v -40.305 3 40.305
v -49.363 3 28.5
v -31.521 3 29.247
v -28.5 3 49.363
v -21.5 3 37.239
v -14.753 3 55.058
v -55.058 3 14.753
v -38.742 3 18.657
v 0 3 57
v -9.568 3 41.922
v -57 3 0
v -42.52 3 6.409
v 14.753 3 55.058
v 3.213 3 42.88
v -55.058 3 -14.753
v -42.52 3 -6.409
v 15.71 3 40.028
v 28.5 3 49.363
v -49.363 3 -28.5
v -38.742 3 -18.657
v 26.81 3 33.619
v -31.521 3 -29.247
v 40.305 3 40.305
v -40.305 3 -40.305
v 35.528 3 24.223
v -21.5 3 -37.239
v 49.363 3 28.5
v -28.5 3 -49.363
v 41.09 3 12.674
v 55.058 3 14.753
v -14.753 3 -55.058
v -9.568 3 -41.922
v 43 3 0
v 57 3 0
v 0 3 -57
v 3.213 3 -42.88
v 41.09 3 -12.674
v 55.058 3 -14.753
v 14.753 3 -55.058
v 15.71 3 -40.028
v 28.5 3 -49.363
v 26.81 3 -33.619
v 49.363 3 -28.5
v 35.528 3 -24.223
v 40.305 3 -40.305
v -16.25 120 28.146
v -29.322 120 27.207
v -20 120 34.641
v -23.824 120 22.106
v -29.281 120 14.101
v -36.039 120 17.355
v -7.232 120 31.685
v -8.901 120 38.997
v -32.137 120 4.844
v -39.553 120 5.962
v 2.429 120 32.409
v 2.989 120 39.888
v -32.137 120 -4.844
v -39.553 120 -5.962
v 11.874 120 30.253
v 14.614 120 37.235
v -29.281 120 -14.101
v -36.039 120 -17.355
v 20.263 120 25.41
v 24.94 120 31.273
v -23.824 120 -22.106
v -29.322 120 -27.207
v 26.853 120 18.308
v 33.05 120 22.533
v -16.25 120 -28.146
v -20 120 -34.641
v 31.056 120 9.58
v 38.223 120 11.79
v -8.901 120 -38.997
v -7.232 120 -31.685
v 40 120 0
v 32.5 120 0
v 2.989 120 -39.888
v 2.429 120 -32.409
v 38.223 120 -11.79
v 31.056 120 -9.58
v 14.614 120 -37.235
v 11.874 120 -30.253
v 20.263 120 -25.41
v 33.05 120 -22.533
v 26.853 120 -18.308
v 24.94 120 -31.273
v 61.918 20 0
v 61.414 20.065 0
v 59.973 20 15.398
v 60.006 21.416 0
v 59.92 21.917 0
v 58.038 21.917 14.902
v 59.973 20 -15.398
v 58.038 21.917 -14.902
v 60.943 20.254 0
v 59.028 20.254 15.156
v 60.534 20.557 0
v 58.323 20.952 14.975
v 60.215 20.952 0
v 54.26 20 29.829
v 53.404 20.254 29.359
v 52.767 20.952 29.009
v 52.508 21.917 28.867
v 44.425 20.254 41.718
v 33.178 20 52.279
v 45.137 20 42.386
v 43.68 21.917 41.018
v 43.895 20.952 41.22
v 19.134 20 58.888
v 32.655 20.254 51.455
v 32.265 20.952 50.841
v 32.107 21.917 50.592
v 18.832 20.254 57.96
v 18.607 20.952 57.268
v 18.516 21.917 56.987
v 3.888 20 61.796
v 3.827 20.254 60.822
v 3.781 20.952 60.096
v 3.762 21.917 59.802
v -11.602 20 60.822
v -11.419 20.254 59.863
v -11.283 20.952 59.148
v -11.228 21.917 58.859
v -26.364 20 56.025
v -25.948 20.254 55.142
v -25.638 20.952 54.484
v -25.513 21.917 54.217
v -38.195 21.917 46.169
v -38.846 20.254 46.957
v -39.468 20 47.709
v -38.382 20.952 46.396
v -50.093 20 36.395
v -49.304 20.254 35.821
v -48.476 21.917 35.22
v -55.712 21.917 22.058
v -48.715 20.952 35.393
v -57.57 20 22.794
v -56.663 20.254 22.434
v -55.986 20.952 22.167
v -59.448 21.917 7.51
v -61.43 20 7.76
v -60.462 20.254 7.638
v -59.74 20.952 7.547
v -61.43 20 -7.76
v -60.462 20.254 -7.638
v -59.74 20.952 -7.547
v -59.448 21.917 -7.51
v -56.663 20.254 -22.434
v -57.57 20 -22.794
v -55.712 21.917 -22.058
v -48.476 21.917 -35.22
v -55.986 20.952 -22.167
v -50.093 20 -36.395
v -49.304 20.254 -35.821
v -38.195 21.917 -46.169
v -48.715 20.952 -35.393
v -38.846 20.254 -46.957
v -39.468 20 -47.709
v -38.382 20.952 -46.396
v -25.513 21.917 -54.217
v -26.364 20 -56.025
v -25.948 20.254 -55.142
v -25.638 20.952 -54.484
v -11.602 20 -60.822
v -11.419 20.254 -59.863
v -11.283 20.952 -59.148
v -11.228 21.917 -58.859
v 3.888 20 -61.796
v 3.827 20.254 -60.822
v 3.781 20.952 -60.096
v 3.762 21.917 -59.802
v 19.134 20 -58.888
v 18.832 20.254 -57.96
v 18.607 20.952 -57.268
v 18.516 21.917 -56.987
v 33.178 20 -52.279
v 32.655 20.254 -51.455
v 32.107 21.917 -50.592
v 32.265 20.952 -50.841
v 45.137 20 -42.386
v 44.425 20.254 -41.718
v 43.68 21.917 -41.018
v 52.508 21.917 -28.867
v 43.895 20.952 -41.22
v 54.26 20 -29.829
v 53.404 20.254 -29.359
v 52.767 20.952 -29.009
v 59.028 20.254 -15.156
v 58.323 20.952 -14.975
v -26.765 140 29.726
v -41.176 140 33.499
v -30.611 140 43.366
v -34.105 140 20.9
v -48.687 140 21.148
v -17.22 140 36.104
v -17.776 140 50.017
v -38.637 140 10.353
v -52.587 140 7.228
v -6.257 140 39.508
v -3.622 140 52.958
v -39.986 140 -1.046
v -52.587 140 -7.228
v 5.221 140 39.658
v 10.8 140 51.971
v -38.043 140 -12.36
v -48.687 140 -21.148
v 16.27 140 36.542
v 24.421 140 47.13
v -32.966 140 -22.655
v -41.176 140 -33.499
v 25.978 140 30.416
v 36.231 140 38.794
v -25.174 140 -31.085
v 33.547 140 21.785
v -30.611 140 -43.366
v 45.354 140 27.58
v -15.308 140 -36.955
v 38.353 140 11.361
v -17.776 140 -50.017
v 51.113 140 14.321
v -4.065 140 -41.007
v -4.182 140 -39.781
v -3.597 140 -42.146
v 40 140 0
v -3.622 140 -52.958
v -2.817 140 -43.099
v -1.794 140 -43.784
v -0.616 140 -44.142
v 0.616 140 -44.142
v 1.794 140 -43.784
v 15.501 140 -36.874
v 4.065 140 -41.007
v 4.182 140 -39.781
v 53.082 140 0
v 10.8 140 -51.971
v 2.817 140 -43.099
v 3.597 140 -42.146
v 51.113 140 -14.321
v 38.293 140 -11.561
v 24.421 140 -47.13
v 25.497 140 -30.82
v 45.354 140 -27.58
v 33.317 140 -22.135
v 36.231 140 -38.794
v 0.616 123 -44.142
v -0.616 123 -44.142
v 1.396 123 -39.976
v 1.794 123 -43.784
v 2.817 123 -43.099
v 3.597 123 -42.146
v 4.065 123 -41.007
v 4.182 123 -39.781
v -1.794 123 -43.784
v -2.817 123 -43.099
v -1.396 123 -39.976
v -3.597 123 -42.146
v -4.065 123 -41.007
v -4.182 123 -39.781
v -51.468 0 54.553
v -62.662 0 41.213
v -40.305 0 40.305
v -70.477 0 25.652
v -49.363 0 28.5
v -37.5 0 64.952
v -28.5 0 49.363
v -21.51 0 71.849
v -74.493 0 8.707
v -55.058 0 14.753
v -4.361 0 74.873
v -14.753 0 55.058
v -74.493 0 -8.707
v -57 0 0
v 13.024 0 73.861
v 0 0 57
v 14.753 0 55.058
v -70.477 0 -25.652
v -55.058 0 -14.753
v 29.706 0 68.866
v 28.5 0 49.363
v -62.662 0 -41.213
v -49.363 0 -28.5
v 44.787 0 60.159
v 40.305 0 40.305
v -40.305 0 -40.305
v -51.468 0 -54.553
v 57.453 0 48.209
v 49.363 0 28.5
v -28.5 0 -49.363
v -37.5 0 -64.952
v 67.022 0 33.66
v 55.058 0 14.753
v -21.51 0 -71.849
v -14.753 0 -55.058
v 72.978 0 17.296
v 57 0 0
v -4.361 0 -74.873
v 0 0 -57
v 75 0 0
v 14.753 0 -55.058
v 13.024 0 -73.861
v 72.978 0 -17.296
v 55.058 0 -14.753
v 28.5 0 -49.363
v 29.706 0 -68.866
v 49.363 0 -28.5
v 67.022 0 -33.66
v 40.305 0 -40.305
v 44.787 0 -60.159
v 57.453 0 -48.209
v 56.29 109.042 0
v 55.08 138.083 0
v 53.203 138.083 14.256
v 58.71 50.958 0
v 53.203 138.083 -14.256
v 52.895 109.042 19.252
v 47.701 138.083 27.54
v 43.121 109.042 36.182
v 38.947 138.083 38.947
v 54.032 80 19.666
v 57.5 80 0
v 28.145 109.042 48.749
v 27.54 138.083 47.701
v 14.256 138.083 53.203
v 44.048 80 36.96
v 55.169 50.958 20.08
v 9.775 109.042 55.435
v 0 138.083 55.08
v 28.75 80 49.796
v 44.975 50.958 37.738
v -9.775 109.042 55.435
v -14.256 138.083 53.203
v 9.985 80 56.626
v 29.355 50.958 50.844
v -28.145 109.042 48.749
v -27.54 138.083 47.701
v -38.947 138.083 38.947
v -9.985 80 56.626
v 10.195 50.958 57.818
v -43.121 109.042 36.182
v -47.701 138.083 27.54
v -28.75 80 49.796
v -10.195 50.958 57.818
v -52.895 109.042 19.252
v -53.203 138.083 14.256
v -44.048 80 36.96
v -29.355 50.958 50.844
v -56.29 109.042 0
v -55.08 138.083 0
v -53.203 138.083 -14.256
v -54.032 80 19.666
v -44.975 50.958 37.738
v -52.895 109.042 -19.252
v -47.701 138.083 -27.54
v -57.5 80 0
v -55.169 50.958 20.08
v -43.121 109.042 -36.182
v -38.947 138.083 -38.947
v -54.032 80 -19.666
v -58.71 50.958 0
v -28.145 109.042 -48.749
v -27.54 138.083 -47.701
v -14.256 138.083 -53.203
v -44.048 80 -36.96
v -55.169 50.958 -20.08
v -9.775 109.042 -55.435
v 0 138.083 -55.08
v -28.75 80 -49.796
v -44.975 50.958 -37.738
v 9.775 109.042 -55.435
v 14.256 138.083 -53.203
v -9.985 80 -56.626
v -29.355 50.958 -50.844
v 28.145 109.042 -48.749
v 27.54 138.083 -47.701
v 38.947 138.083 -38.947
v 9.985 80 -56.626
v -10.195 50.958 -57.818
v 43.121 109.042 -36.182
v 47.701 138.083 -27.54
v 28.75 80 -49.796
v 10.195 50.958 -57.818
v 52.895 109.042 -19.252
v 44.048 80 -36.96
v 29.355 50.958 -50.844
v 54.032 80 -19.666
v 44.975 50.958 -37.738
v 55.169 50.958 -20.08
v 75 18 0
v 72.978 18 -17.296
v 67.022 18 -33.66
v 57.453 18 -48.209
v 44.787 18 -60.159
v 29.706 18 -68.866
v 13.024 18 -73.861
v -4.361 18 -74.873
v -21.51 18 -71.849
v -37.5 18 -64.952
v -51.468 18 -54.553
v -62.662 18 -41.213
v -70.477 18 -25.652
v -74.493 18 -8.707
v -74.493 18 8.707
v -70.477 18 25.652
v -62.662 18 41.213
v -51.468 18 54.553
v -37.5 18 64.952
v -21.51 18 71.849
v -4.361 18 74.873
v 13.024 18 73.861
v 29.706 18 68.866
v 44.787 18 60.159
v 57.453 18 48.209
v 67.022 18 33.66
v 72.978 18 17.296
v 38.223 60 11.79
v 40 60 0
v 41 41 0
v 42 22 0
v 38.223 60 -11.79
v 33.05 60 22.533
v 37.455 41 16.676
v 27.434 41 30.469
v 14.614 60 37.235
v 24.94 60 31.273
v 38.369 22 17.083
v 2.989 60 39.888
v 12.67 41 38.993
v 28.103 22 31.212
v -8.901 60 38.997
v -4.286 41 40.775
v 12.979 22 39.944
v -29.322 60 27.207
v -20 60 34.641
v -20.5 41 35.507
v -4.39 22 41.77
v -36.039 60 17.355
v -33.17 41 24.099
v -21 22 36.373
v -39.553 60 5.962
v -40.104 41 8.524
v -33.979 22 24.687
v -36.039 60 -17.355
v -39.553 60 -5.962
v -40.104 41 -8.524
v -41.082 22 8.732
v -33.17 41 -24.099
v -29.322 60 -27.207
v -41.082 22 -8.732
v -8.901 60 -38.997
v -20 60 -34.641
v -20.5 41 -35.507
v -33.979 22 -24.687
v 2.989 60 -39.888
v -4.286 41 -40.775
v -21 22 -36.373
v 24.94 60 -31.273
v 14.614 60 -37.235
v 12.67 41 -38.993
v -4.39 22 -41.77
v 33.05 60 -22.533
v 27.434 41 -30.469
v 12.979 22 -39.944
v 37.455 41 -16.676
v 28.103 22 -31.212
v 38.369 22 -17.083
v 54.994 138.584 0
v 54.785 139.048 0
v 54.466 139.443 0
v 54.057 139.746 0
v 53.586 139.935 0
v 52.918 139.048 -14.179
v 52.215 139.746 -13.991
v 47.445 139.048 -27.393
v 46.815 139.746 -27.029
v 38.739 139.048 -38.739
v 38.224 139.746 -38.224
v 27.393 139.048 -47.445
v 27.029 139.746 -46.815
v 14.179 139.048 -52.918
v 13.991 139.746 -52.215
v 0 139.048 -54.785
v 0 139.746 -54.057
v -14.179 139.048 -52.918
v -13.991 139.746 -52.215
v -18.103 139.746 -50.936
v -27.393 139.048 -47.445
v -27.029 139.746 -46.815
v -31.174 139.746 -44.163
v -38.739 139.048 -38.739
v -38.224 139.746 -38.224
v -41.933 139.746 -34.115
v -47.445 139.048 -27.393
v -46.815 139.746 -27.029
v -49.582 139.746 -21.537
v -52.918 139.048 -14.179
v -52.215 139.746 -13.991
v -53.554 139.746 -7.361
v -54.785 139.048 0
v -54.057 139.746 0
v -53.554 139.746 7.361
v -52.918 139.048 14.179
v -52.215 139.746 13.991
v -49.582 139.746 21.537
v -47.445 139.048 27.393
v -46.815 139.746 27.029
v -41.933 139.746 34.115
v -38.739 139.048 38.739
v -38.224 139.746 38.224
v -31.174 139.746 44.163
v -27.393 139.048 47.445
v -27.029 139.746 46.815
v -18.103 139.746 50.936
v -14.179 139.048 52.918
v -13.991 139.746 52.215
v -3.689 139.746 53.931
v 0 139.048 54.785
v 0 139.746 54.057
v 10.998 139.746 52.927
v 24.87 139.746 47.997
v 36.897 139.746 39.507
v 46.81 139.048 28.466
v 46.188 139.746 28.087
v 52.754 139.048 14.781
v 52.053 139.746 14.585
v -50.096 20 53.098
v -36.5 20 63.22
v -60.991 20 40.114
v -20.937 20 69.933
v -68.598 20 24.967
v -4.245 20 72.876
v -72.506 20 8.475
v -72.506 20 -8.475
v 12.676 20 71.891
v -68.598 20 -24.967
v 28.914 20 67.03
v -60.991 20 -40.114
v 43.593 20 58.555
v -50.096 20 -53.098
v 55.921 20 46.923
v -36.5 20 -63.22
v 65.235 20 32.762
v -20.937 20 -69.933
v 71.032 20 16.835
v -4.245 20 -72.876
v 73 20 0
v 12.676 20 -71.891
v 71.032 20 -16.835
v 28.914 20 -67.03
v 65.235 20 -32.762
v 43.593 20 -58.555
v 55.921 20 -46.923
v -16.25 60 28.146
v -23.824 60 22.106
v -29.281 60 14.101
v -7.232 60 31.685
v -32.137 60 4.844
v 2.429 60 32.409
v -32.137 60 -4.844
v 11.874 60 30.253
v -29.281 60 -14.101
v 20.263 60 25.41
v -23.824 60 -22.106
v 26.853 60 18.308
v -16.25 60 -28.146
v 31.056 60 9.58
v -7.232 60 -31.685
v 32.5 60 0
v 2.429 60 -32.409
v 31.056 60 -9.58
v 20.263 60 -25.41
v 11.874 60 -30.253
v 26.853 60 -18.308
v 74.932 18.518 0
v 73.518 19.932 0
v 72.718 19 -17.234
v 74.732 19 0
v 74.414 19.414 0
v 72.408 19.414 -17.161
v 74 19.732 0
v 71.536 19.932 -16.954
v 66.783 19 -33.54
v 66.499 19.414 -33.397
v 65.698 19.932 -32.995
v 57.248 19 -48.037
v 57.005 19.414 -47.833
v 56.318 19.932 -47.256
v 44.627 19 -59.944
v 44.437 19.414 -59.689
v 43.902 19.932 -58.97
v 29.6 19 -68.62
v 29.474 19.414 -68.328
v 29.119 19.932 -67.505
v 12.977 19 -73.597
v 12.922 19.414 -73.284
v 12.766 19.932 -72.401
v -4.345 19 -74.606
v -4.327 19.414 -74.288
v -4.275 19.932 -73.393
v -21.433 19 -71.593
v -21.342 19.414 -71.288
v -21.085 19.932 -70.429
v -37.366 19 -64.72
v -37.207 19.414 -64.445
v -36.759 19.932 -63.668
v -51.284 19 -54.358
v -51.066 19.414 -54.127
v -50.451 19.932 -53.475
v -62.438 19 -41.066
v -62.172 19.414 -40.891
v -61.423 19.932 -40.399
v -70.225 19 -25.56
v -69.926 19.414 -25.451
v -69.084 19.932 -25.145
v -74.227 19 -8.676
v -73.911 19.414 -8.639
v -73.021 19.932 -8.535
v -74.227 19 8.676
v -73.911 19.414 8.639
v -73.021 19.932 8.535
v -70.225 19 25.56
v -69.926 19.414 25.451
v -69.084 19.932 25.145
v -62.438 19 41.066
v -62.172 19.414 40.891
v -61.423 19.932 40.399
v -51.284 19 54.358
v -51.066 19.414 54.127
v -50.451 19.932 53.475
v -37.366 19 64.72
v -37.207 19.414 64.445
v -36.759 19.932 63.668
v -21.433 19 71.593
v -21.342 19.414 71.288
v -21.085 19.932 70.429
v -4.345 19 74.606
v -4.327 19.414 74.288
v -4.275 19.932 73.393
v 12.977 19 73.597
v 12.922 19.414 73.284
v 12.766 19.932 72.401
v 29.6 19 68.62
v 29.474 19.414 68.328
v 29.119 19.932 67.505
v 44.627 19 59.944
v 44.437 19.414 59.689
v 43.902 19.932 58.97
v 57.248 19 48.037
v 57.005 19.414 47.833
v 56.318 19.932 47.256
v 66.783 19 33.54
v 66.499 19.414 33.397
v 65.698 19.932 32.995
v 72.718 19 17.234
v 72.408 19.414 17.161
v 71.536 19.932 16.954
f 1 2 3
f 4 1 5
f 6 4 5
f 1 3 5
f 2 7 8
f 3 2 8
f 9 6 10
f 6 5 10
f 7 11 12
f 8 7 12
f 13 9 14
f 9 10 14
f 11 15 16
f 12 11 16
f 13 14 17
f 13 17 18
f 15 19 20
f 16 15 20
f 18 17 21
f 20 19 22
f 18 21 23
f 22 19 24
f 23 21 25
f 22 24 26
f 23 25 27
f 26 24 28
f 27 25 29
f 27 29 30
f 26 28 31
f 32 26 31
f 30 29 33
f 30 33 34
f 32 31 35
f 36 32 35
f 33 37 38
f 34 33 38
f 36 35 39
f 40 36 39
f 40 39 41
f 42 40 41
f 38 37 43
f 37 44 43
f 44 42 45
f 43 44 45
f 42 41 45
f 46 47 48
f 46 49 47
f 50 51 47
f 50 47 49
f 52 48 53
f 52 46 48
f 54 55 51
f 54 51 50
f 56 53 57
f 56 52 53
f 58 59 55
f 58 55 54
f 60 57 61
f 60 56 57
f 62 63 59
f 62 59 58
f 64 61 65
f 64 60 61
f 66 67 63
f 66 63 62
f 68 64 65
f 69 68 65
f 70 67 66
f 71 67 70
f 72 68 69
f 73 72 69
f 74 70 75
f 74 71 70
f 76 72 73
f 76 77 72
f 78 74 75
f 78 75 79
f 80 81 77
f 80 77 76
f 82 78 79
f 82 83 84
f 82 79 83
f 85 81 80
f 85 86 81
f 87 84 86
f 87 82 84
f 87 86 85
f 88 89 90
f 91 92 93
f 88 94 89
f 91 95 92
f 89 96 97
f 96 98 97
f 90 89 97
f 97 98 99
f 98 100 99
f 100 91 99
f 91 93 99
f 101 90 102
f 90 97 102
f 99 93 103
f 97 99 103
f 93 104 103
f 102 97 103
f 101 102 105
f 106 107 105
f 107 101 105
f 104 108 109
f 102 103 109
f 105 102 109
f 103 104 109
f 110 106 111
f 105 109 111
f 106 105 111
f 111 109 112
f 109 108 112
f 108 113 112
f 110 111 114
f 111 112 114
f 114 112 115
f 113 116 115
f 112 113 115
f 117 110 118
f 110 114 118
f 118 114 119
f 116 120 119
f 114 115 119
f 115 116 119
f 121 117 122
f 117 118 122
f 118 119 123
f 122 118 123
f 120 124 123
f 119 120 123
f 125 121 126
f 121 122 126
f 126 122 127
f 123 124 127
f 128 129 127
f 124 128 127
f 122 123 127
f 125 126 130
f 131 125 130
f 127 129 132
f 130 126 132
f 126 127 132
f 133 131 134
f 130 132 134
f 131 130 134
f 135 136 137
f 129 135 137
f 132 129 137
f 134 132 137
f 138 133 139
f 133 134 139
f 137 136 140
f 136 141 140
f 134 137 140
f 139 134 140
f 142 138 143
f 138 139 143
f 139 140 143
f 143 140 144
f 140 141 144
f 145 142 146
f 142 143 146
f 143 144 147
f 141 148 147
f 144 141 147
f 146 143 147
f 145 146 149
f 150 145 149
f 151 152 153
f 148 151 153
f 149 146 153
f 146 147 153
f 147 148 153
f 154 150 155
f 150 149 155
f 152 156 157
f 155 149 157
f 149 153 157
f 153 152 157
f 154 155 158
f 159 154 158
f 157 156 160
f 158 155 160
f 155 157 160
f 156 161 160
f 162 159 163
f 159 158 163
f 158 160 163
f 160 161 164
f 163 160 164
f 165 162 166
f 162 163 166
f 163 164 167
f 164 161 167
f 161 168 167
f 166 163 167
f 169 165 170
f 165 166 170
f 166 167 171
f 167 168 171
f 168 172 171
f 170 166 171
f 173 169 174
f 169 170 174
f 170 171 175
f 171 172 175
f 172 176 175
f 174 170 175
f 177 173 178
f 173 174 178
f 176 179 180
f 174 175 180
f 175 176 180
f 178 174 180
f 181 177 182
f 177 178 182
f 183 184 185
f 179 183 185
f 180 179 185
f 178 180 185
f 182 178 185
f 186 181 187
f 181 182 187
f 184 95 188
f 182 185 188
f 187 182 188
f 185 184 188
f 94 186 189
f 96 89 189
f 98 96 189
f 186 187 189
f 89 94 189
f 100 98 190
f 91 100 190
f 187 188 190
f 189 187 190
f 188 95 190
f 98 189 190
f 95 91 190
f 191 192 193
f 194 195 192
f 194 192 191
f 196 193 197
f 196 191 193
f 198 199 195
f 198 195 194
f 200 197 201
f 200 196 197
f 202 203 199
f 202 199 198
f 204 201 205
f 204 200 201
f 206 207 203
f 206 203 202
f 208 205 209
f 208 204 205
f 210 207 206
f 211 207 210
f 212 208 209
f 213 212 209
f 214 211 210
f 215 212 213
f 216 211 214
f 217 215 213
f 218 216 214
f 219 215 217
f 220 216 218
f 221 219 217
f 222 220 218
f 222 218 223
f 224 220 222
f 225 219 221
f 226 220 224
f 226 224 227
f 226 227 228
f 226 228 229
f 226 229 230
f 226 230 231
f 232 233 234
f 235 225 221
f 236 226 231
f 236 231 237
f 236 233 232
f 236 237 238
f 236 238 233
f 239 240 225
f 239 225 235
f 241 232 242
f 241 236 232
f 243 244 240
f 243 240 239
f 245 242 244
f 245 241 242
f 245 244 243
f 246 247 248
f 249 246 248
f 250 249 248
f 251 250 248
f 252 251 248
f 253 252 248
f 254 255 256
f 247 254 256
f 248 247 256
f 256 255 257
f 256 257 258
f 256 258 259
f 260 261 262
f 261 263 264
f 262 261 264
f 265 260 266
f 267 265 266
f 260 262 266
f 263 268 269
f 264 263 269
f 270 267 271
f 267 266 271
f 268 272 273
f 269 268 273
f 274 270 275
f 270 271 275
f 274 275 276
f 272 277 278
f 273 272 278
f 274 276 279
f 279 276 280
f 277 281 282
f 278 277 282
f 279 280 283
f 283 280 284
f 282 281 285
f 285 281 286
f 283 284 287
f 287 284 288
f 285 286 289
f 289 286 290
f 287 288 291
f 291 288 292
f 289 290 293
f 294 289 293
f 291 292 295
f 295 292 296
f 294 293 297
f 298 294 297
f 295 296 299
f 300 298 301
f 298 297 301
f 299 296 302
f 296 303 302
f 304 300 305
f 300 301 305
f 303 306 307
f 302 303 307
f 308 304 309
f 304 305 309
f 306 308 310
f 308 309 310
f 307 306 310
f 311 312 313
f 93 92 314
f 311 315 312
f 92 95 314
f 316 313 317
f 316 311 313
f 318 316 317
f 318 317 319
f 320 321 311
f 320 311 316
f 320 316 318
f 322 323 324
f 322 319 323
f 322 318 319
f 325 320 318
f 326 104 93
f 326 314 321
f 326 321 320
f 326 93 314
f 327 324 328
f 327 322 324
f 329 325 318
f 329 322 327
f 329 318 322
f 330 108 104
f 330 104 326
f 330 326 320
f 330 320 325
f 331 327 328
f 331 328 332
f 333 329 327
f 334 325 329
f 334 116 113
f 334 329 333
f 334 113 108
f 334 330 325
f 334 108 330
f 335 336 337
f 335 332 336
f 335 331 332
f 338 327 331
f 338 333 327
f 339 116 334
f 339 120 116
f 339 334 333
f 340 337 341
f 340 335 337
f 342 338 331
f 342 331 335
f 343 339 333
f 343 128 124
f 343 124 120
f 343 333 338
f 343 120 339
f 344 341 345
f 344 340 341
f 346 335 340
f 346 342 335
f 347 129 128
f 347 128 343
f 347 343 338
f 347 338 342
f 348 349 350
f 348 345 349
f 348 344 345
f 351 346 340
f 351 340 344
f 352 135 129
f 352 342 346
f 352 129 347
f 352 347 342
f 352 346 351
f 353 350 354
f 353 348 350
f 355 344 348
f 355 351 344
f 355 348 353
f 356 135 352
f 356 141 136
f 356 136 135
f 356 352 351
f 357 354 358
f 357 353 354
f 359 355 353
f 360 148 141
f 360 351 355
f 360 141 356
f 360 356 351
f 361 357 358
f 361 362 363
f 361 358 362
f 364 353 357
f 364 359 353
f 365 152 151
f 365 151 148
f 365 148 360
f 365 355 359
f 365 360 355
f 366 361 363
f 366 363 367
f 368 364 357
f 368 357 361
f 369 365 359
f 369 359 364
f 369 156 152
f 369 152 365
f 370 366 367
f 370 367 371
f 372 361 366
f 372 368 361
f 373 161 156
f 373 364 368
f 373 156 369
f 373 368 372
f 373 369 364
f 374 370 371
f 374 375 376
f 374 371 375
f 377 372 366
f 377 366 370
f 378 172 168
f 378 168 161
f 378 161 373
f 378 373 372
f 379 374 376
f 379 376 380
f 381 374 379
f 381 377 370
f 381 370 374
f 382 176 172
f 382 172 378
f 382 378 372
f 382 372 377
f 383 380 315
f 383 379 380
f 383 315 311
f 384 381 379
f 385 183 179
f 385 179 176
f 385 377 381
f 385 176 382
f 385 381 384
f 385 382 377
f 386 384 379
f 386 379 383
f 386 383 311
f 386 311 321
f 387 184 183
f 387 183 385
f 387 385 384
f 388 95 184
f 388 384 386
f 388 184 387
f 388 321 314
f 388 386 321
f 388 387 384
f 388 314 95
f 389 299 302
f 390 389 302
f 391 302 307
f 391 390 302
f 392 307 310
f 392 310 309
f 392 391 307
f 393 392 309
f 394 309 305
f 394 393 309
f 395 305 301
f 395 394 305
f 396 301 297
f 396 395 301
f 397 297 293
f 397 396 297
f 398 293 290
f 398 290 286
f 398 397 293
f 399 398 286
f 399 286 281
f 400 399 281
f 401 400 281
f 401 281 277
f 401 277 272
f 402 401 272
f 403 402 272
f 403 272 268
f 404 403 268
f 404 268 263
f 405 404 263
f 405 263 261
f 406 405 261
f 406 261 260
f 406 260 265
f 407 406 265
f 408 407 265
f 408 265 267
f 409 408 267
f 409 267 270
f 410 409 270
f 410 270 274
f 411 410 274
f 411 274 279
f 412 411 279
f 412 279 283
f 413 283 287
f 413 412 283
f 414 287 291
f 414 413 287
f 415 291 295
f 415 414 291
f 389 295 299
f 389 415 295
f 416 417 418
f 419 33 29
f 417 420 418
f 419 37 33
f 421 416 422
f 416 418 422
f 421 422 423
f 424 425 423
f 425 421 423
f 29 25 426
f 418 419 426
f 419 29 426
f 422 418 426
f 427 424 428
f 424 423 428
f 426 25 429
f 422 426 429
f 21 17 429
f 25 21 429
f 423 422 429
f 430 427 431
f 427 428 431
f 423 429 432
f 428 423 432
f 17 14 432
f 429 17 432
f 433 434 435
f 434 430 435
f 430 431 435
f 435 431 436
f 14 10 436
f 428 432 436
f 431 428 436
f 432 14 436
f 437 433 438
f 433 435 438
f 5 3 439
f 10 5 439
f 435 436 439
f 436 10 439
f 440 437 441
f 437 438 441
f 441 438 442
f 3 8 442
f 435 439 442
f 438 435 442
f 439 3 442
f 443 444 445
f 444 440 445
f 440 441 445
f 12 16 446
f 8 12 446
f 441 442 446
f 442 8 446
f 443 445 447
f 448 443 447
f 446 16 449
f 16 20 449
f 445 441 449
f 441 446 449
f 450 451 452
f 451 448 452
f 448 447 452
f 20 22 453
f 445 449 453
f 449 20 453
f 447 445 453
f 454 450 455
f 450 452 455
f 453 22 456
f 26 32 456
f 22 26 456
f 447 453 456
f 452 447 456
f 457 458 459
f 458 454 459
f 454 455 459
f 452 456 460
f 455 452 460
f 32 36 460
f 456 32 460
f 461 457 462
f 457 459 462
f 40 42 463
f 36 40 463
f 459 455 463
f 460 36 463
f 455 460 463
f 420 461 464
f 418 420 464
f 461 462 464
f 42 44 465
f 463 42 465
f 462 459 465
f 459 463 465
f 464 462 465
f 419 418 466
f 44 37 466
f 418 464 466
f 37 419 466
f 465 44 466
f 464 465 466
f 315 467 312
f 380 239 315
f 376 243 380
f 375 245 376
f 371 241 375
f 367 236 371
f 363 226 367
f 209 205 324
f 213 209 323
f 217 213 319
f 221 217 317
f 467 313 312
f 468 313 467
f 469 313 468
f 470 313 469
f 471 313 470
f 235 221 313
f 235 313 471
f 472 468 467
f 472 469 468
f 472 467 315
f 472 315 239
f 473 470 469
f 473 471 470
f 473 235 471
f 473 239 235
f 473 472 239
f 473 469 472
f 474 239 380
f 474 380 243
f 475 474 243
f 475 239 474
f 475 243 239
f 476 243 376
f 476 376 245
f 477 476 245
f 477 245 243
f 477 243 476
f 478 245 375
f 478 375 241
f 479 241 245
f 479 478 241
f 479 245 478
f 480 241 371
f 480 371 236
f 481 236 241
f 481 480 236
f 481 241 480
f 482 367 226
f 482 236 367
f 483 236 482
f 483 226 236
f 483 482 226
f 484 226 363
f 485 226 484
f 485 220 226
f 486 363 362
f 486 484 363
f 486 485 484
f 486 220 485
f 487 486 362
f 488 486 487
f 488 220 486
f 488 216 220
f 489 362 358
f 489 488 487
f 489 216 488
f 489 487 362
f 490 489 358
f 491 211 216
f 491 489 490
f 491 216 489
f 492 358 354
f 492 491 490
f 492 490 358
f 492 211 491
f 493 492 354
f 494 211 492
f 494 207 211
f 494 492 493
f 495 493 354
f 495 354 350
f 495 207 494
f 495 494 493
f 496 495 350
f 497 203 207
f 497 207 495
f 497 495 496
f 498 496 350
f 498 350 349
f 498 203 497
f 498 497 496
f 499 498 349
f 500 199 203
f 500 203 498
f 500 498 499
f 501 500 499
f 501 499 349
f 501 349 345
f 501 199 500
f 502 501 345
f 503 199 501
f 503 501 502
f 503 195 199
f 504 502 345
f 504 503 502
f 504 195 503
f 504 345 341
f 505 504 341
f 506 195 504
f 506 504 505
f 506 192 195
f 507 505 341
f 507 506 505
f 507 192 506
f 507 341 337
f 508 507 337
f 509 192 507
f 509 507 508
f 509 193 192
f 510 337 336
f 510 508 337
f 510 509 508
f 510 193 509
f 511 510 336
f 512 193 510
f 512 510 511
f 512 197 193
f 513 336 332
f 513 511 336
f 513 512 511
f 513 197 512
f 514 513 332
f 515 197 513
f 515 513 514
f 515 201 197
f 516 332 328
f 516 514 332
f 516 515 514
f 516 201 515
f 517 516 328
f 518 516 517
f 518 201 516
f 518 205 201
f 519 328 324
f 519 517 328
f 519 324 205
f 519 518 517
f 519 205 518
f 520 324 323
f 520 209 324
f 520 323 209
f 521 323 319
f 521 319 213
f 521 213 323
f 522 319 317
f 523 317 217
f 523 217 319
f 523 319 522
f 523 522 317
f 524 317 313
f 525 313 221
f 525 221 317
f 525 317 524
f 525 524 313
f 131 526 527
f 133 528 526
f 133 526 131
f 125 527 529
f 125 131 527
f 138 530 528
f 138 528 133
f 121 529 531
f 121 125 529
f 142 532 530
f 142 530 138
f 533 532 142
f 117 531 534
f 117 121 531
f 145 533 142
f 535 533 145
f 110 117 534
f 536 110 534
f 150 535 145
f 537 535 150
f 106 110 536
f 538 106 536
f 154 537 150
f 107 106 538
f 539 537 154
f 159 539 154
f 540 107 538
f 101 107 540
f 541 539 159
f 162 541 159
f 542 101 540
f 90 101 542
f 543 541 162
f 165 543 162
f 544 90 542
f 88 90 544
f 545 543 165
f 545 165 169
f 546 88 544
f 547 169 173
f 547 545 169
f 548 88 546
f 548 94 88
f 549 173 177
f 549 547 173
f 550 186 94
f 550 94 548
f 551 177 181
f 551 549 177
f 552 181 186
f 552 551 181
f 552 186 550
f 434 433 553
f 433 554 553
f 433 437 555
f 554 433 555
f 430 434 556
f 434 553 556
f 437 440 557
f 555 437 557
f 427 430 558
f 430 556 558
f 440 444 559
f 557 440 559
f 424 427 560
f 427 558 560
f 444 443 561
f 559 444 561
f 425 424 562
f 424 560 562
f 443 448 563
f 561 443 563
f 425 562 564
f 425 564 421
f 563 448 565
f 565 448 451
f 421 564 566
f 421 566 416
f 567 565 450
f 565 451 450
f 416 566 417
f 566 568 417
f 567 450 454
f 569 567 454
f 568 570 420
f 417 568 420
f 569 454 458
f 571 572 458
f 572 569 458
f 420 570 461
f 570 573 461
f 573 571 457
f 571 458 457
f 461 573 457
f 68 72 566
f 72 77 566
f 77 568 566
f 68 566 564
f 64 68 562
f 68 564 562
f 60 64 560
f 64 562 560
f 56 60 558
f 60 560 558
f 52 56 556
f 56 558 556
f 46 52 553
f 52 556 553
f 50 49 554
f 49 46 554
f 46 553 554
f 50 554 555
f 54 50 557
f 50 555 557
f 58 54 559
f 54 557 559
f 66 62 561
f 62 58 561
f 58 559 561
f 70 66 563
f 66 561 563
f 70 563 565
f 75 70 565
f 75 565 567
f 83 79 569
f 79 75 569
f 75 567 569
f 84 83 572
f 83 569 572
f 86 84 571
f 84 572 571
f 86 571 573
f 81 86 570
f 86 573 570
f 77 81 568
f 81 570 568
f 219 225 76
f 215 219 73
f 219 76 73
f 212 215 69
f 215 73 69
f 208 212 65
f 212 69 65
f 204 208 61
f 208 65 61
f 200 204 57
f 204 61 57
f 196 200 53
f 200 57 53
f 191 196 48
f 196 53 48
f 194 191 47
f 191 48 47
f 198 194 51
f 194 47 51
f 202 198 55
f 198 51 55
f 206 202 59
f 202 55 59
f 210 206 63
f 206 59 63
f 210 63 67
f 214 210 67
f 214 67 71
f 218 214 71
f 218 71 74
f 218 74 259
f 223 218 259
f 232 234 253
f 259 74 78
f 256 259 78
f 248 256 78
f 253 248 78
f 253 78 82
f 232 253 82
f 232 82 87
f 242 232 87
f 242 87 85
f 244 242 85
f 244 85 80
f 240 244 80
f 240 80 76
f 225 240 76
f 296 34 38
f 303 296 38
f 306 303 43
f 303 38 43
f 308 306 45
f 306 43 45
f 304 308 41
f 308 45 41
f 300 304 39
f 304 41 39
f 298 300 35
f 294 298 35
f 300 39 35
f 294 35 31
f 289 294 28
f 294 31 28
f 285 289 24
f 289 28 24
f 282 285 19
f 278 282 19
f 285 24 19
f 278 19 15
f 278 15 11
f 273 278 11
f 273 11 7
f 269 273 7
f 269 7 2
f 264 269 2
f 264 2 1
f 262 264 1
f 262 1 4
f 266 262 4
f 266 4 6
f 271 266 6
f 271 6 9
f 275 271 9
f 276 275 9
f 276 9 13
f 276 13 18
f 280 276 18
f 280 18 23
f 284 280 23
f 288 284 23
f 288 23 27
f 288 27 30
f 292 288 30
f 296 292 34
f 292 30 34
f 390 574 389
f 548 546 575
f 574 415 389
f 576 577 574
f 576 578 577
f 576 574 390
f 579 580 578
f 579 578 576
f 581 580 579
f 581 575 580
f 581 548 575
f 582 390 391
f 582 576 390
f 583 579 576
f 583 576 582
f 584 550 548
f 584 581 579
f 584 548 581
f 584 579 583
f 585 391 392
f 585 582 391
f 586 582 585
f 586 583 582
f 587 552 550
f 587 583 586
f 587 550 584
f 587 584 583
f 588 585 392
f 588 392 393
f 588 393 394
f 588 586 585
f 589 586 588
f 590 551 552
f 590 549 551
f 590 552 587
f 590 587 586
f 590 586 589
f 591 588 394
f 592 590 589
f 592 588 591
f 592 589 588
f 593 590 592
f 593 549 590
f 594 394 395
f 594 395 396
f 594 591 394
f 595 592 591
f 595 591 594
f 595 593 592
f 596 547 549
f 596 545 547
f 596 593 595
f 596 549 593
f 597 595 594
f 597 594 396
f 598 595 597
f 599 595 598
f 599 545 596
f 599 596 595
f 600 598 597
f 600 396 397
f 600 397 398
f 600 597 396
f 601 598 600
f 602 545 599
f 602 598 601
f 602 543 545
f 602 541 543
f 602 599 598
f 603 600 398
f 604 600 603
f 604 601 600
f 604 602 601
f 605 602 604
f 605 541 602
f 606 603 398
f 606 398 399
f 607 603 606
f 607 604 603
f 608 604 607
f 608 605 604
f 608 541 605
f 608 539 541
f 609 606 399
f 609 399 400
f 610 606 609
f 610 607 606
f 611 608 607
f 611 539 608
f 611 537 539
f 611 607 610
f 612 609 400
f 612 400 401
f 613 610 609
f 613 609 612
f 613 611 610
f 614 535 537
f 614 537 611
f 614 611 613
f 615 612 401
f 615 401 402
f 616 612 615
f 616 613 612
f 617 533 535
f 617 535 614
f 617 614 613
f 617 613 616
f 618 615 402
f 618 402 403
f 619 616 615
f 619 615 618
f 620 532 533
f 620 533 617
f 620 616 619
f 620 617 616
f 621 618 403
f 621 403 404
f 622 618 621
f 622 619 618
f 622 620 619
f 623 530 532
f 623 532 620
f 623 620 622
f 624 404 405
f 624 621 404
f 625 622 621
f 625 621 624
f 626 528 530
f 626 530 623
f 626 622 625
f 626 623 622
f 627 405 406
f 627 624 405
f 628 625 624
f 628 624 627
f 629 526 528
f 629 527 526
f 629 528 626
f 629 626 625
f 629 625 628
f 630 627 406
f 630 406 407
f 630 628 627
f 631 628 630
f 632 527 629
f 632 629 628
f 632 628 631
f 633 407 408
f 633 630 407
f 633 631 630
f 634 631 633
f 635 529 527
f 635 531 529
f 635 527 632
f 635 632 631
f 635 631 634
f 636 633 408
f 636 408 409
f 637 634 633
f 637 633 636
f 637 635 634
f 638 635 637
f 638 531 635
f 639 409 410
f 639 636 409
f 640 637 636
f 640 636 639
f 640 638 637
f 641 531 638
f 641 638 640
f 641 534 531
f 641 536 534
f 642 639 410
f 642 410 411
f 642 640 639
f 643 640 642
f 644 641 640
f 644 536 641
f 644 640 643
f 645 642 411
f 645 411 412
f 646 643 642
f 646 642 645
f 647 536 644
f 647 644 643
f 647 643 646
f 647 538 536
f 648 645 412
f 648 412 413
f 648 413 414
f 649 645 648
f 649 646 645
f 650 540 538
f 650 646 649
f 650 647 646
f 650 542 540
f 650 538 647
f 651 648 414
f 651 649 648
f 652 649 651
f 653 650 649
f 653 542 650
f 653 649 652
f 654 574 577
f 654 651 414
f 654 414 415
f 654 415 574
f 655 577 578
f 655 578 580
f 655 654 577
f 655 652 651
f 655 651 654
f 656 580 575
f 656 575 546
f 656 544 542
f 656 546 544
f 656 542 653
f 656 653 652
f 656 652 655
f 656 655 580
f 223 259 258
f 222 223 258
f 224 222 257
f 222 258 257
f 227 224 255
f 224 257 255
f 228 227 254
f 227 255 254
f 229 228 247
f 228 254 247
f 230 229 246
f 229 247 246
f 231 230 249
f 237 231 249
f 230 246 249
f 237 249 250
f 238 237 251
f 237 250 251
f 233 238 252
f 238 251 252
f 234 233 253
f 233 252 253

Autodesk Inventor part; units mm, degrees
ref_plane "YZ Plane" through (0, 0, 0) normal (1, 0, 0) x (0, 1, 0)
ref_plane "XZ Plane" through (0, 0, 0) normal (0, 1, 0) x (-1, 0, 0)
ref_plane "XY Plane" through (0, 0, 0) normal (0, 0, 1) x (1, 0, 0)
sketch "草图1" plane through (0, 0, 0) normal (0, 0, 1) x (1, 0, 0)
  line L0 (0, 0) -> (57, 0)
  line L1 (57, 0) -> (75, 0)
  line L2 (75, 0) -> (75, 20)
  line L3 (0, 0) -> (0, 140)
  line L4 (0, 140) -> (55, 140)
  line L5 (0, 140) -> (40, 140)
  line L6 (40, 140) -> (40, 120)
  line L7 (40, 120) -> (32.5, 120)
  line L8 (32.5, 120) -> (32.5, 60)
  line L9 (32.5, 60) -> (40, 60)
  line L10 (57, 0) -> (57, 3)
  line L11 (57, 3) -> (0, 3)
  line L12 (0, 3) -> (43, 3)
  line L13 (43, 3) -> (40, 60)
  line L14 (75, 20) -> (0, 20)
  line L15 (0, 20) -> (60, 20)
  line L16 (60, 20) -> (55, 140)
  dimension "d0" = 57
  dimension "d1" = 18
  dimension "d2" = 20
  dimension "d3" = 140
  dimension "d4" = 55
  dimension "d5" = 40
  dimension "d6" = 20
  dimension "d7" = 7.5
  dimension "d10" = 7.5
  dimension "d11" = 3
  dimension "d12" = 43
  dimension "d13" = 60
revolve "旋转1" add sketch "草图1" angle 360 about axis through (0, 0, 0) along (0, 1, 0) contours L10 L11 L13 L14 L2 L1 | L13 L9 L8 L7 L6 L4 L16 L14
fillet "圆角1" radius 2 1 edges at (-75, 20, 0)
fillet "圆角2" radius 2 1 edges at (-60, 20, 0)
fillet "圆角3" radius 2 1 edges at (-55, 140, 0)
sketch "草图2" plane through (0, 140, 0) normal (0, 1, 0) x (1, 0, 0)
  circle A0 centre (0, 0) radius 40 projected
  point P0 (0, 40)
hole "孔1" at (0, 140, -40) direction (0, -1, 0) diameter 8.376 depth 17 thread size "M10x1.5" designation "M10" class "6H" standard "GB Metric profile"
properties part number "底座"
